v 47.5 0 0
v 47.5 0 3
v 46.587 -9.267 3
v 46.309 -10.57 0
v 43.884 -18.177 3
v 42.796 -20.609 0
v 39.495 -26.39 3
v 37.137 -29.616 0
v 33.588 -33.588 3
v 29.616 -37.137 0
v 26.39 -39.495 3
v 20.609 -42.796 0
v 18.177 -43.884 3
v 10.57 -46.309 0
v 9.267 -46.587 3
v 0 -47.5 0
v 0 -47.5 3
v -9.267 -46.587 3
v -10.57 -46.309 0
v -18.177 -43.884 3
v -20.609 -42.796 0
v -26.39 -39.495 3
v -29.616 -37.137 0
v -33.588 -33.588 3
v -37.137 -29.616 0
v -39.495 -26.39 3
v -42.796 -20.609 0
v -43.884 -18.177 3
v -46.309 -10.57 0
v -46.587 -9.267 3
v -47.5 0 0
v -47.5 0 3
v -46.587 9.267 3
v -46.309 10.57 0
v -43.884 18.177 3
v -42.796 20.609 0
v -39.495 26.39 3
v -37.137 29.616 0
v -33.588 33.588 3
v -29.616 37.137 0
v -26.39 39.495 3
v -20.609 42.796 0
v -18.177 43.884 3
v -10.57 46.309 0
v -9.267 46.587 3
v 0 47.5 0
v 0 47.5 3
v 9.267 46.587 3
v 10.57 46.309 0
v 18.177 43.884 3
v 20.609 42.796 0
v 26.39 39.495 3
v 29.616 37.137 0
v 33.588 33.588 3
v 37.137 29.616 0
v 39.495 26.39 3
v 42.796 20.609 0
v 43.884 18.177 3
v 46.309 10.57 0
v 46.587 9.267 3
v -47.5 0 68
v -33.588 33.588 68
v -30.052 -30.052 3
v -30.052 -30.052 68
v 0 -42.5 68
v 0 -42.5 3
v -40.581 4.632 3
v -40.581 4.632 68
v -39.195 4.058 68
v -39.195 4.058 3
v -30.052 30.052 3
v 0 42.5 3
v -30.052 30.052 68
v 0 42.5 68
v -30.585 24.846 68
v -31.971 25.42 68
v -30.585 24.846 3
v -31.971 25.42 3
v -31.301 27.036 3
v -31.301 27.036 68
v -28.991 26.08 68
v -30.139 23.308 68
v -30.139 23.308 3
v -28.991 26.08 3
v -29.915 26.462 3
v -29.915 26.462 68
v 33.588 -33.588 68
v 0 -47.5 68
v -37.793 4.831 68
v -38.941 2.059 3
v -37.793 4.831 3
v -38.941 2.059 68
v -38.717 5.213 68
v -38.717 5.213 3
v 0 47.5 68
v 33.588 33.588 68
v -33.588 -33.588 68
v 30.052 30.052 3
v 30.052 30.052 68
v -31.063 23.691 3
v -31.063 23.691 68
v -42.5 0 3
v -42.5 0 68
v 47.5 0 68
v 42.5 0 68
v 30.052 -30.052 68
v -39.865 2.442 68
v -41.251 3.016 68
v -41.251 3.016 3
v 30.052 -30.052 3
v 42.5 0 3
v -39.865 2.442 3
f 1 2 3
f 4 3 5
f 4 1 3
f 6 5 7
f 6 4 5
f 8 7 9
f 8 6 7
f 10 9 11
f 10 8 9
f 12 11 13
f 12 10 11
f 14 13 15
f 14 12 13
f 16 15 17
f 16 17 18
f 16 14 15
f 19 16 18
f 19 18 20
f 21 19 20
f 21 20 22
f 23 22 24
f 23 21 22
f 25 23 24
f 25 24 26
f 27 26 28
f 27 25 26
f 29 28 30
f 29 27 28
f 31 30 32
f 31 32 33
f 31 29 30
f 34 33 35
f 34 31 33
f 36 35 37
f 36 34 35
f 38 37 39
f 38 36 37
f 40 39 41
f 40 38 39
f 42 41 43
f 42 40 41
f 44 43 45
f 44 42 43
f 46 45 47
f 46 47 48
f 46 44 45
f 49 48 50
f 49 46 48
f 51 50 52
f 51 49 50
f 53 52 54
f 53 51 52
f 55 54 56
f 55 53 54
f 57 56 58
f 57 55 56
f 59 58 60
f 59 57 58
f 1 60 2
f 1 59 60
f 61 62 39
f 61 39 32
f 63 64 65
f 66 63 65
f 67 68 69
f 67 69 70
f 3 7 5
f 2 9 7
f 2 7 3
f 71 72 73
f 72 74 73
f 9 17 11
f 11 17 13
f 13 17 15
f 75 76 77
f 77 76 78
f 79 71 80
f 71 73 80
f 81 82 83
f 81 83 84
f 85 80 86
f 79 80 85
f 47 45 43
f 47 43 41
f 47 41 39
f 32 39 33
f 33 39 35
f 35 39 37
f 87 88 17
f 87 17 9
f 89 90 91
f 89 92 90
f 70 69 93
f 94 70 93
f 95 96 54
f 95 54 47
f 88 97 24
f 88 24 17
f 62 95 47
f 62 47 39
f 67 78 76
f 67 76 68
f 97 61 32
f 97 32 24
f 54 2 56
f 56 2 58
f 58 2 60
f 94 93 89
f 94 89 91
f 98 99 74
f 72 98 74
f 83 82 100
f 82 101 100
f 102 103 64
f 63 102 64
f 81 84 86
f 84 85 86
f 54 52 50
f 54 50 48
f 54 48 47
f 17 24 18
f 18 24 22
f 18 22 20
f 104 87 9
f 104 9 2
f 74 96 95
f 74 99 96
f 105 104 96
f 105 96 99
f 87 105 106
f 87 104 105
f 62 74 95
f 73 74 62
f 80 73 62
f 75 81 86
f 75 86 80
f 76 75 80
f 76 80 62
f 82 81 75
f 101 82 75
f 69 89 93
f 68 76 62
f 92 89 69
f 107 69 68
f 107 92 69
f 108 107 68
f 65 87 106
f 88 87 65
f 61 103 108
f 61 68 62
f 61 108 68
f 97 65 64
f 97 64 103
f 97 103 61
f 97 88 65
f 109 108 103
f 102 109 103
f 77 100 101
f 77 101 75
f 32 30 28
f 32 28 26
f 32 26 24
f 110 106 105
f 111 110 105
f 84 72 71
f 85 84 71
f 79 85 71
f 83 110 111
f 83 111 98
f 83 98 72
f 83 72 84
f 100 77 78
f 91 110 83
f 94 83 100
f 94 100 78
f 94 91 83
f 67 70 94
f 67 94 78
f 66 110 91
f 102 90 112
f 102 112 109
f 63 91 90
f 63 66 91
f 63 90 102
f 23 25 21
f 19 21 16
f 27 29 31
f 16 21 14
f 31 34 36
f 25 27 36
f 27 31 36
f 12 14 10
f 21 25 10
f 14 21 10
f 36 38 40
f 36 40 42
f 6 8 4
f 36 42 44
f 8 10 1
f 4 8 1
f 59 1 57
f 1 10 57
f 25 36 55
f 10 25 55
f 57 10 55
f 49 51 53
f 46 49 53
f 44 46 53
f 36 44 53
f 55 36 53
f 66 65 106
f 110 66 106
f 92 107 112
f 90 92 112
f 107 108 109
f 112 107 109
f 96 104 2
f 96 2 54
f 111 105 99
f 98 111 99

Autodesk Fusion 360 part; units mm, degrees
sketch "Sketch1" plane through (0, 0, 0) normal (0, 0, 1) x (1, 0, 0)
  circle A0 centre (0, 0) radius 47.5
  dimension "d1" = 95
extrude "Extrude1" add sketch "Sketch1" along normal blind 3
sketch "Sketch4" plane through (0, 0, 3) normal (0, 0, 1) x (-1, 0, 0)
  circle A0 centre (0, 0) radius 47.5
  line L0 (-47.5, 0) -> (-33.5876, -33.5876)
  line L1 (-33.5876, -33.5876) -> (0, -47.5)
  line L2 (0, -47.5) -> (33.5876, -33.5876)
  line L3 (33.5876, -33.5876) -> (47.5, 0)
  line L4 (47.5, 0) -> (33.5876, 33.5876)
  line L5 (33.5876, 33.5876) -> (0, 47.5)
  line L6 (0, 47.5) -> (-33.5876, 33.5876)
  line L7 (-33.5876, 33.5876) -> (-47.5, 0)
  dimension "d5" = 47.5
extrude "Extrude2" add sketch "Sketch4" along normal blind 65 contours L0 L1 L2 L3 L4 L5 L6 L7
sketch "Sketch5" plane through (0, 0, 68) normal (0, 0, 1) x (-1, 0, 0)
  line L0 (-33.5876, 33.5876) -> (-47.5, 0)
  line L1 (-47.5, 0) -> (-33.5876, -33.5876)
  line L2 (-33.5876, -33.5876) -> (0, -47.5)
  line L3 (0, -47.5) -> (33.5876, -33.5876)
  line L4 (33.5876, -33.5876) -> (47.5, 0)
  line L5 (47.5, 0) -> (33.5876, 33.5876)
  line L6 (33.5876, 33.5876) -> (0, 47.5)
  line L7 (0, 47.5) -> (-33.5876, 33.5876)
  line L8 (42.5, 0) -> (30.052, 30.052)
  line L9 (30.052, 30.052) -> (0, 42.5)
  line L10 (0, 42.5) -> (-30.052, 30.052)
  line L11 (-30.052, 30.052) -> (-42.5, 0)
  line L12 (-42.5, 0) -> (-30.052, -30.052)
  line L13 (-30.052, -30.052) -> (0, -42.5)
  line L14 (0, -42.5) -> (30.052, -30.052)
  line L15 (30.052, -30.052) -> (42.5, 0)
  dimension "d8" = 42.5
extrude "Extrude3" cut sketch "Sketch5" against normal blind 65 contours L8 L9 L10 L11 L12 L13 L14 L15
sketch "Sketch6" plane through (-36.276, 15.026, 0) normal (0.9239, -0.3827, 0) x (0.3827, 0.9239, 0)
  line L0 (16.264, 68) -> (-16.264, 68)
  line L1 (-16.264, 68) -> (-16.264, 3)
  line L2 (-16.264, 3) -> (16.264, 3)
  line L3 (16.264, 3) -> (16.264, 68)
  line L4 (-16.264, 68) -> (16.264, 68)
  line L5 (0, 68) -> (-11, 68)
  line L6 (0, 68) -> (11, 68)
  line L7 (11, 68) -> (13, 68)
  line L8 (13, 68) -> (13, 3)
  line L9 (13, 3) -> (11, 3)
  line L10 (-11, 68) -> (-13, 68)
  line L11 (-13, 68) -> (-13, 3)
  line L12 (-13, 3) -> (-11, 3)
  line L13 (-13, 68) -> (-11.25, 68)
  line L14 (-11.25, 68) -> (-11.25, 3)
  line L15 (-11.25, 3) -> (-13, 3)
  line L16 (-13, 3) -> (-13, 68)
  line L17 (13, 68) -> (11.25, 68)
  line L18 (11.25, 68) -> (11.25, 3)
  line L19 (11.25, 3) -> (13, 3)
  line L20 (13, 3) -> (13, 68)
  dimension "d11" = 11
  dimension "d12" = 11
  dimension "d13" = 2
  dimension "d14" = 65
  dimension "d25" = 1.75
  dimension "d26" = 65
  dimension "d27" = 1.75
  dimension "d28" = 65
extrude "Extrude4" add sketch "Sketch6" along normal blind 1.5 contours L0 L2 L4 L7 L8 L9 L17 L18 L19 L20 | L0 L2 L4 L10 L11 L12 L13 L14 L15 L16
sketch "Sketch7" plane through (-34.8902, 14.452, 0) normal (0.9239, -0.3827, 0) x (0.3827, 0.9239, 0)
  line L0 (-11.25, 68) -> (-13, 68)
  line L1 (-13, 68) -> (-13, 3)
  line L2 (-13, 3) -> (-11.25, 3)
  line L3 (-13, 68) -> (-10, 68)
  line L4 (-10, 68) -> (-10, 3)
  line L5 (-10, 3) -> (-13, 3)
  line L6 (-13, 3) -> (-13, 68)
  line L7 (-11.25, 3) -> (-11.25, 68)
  dimension "d17" = 3
  dimension "d18" = 65
extrude "Extrude5" add sketch "Sketch7" along normal blind 1
sketch "Sketch8" plane through (-34.8902, 14.452, 0) normal (0.9239, -0.3827, 0) x (0.3827, 0.9239, 0)
  line L0 (11.25, 3) -> (13, 3)
  line L1 (13, 68) -> (11.25, 68)
  line L2 (13, 68) -> (10, 68)
  line L3 (10, 68) -> (10, 3)
  line L4 (10, 3) -> (13, 3)
  line L5 (13, 3) -> (13, 68)
  line L6 (13, 3) -> (13, 68)
  line L7 (11.25, 68) -> (11.25, 3)
  dimension "d21" = 3
  dimension "d22" = 65
extrude "Extrude6" add sketch "Sketch8" along normal blind 1
